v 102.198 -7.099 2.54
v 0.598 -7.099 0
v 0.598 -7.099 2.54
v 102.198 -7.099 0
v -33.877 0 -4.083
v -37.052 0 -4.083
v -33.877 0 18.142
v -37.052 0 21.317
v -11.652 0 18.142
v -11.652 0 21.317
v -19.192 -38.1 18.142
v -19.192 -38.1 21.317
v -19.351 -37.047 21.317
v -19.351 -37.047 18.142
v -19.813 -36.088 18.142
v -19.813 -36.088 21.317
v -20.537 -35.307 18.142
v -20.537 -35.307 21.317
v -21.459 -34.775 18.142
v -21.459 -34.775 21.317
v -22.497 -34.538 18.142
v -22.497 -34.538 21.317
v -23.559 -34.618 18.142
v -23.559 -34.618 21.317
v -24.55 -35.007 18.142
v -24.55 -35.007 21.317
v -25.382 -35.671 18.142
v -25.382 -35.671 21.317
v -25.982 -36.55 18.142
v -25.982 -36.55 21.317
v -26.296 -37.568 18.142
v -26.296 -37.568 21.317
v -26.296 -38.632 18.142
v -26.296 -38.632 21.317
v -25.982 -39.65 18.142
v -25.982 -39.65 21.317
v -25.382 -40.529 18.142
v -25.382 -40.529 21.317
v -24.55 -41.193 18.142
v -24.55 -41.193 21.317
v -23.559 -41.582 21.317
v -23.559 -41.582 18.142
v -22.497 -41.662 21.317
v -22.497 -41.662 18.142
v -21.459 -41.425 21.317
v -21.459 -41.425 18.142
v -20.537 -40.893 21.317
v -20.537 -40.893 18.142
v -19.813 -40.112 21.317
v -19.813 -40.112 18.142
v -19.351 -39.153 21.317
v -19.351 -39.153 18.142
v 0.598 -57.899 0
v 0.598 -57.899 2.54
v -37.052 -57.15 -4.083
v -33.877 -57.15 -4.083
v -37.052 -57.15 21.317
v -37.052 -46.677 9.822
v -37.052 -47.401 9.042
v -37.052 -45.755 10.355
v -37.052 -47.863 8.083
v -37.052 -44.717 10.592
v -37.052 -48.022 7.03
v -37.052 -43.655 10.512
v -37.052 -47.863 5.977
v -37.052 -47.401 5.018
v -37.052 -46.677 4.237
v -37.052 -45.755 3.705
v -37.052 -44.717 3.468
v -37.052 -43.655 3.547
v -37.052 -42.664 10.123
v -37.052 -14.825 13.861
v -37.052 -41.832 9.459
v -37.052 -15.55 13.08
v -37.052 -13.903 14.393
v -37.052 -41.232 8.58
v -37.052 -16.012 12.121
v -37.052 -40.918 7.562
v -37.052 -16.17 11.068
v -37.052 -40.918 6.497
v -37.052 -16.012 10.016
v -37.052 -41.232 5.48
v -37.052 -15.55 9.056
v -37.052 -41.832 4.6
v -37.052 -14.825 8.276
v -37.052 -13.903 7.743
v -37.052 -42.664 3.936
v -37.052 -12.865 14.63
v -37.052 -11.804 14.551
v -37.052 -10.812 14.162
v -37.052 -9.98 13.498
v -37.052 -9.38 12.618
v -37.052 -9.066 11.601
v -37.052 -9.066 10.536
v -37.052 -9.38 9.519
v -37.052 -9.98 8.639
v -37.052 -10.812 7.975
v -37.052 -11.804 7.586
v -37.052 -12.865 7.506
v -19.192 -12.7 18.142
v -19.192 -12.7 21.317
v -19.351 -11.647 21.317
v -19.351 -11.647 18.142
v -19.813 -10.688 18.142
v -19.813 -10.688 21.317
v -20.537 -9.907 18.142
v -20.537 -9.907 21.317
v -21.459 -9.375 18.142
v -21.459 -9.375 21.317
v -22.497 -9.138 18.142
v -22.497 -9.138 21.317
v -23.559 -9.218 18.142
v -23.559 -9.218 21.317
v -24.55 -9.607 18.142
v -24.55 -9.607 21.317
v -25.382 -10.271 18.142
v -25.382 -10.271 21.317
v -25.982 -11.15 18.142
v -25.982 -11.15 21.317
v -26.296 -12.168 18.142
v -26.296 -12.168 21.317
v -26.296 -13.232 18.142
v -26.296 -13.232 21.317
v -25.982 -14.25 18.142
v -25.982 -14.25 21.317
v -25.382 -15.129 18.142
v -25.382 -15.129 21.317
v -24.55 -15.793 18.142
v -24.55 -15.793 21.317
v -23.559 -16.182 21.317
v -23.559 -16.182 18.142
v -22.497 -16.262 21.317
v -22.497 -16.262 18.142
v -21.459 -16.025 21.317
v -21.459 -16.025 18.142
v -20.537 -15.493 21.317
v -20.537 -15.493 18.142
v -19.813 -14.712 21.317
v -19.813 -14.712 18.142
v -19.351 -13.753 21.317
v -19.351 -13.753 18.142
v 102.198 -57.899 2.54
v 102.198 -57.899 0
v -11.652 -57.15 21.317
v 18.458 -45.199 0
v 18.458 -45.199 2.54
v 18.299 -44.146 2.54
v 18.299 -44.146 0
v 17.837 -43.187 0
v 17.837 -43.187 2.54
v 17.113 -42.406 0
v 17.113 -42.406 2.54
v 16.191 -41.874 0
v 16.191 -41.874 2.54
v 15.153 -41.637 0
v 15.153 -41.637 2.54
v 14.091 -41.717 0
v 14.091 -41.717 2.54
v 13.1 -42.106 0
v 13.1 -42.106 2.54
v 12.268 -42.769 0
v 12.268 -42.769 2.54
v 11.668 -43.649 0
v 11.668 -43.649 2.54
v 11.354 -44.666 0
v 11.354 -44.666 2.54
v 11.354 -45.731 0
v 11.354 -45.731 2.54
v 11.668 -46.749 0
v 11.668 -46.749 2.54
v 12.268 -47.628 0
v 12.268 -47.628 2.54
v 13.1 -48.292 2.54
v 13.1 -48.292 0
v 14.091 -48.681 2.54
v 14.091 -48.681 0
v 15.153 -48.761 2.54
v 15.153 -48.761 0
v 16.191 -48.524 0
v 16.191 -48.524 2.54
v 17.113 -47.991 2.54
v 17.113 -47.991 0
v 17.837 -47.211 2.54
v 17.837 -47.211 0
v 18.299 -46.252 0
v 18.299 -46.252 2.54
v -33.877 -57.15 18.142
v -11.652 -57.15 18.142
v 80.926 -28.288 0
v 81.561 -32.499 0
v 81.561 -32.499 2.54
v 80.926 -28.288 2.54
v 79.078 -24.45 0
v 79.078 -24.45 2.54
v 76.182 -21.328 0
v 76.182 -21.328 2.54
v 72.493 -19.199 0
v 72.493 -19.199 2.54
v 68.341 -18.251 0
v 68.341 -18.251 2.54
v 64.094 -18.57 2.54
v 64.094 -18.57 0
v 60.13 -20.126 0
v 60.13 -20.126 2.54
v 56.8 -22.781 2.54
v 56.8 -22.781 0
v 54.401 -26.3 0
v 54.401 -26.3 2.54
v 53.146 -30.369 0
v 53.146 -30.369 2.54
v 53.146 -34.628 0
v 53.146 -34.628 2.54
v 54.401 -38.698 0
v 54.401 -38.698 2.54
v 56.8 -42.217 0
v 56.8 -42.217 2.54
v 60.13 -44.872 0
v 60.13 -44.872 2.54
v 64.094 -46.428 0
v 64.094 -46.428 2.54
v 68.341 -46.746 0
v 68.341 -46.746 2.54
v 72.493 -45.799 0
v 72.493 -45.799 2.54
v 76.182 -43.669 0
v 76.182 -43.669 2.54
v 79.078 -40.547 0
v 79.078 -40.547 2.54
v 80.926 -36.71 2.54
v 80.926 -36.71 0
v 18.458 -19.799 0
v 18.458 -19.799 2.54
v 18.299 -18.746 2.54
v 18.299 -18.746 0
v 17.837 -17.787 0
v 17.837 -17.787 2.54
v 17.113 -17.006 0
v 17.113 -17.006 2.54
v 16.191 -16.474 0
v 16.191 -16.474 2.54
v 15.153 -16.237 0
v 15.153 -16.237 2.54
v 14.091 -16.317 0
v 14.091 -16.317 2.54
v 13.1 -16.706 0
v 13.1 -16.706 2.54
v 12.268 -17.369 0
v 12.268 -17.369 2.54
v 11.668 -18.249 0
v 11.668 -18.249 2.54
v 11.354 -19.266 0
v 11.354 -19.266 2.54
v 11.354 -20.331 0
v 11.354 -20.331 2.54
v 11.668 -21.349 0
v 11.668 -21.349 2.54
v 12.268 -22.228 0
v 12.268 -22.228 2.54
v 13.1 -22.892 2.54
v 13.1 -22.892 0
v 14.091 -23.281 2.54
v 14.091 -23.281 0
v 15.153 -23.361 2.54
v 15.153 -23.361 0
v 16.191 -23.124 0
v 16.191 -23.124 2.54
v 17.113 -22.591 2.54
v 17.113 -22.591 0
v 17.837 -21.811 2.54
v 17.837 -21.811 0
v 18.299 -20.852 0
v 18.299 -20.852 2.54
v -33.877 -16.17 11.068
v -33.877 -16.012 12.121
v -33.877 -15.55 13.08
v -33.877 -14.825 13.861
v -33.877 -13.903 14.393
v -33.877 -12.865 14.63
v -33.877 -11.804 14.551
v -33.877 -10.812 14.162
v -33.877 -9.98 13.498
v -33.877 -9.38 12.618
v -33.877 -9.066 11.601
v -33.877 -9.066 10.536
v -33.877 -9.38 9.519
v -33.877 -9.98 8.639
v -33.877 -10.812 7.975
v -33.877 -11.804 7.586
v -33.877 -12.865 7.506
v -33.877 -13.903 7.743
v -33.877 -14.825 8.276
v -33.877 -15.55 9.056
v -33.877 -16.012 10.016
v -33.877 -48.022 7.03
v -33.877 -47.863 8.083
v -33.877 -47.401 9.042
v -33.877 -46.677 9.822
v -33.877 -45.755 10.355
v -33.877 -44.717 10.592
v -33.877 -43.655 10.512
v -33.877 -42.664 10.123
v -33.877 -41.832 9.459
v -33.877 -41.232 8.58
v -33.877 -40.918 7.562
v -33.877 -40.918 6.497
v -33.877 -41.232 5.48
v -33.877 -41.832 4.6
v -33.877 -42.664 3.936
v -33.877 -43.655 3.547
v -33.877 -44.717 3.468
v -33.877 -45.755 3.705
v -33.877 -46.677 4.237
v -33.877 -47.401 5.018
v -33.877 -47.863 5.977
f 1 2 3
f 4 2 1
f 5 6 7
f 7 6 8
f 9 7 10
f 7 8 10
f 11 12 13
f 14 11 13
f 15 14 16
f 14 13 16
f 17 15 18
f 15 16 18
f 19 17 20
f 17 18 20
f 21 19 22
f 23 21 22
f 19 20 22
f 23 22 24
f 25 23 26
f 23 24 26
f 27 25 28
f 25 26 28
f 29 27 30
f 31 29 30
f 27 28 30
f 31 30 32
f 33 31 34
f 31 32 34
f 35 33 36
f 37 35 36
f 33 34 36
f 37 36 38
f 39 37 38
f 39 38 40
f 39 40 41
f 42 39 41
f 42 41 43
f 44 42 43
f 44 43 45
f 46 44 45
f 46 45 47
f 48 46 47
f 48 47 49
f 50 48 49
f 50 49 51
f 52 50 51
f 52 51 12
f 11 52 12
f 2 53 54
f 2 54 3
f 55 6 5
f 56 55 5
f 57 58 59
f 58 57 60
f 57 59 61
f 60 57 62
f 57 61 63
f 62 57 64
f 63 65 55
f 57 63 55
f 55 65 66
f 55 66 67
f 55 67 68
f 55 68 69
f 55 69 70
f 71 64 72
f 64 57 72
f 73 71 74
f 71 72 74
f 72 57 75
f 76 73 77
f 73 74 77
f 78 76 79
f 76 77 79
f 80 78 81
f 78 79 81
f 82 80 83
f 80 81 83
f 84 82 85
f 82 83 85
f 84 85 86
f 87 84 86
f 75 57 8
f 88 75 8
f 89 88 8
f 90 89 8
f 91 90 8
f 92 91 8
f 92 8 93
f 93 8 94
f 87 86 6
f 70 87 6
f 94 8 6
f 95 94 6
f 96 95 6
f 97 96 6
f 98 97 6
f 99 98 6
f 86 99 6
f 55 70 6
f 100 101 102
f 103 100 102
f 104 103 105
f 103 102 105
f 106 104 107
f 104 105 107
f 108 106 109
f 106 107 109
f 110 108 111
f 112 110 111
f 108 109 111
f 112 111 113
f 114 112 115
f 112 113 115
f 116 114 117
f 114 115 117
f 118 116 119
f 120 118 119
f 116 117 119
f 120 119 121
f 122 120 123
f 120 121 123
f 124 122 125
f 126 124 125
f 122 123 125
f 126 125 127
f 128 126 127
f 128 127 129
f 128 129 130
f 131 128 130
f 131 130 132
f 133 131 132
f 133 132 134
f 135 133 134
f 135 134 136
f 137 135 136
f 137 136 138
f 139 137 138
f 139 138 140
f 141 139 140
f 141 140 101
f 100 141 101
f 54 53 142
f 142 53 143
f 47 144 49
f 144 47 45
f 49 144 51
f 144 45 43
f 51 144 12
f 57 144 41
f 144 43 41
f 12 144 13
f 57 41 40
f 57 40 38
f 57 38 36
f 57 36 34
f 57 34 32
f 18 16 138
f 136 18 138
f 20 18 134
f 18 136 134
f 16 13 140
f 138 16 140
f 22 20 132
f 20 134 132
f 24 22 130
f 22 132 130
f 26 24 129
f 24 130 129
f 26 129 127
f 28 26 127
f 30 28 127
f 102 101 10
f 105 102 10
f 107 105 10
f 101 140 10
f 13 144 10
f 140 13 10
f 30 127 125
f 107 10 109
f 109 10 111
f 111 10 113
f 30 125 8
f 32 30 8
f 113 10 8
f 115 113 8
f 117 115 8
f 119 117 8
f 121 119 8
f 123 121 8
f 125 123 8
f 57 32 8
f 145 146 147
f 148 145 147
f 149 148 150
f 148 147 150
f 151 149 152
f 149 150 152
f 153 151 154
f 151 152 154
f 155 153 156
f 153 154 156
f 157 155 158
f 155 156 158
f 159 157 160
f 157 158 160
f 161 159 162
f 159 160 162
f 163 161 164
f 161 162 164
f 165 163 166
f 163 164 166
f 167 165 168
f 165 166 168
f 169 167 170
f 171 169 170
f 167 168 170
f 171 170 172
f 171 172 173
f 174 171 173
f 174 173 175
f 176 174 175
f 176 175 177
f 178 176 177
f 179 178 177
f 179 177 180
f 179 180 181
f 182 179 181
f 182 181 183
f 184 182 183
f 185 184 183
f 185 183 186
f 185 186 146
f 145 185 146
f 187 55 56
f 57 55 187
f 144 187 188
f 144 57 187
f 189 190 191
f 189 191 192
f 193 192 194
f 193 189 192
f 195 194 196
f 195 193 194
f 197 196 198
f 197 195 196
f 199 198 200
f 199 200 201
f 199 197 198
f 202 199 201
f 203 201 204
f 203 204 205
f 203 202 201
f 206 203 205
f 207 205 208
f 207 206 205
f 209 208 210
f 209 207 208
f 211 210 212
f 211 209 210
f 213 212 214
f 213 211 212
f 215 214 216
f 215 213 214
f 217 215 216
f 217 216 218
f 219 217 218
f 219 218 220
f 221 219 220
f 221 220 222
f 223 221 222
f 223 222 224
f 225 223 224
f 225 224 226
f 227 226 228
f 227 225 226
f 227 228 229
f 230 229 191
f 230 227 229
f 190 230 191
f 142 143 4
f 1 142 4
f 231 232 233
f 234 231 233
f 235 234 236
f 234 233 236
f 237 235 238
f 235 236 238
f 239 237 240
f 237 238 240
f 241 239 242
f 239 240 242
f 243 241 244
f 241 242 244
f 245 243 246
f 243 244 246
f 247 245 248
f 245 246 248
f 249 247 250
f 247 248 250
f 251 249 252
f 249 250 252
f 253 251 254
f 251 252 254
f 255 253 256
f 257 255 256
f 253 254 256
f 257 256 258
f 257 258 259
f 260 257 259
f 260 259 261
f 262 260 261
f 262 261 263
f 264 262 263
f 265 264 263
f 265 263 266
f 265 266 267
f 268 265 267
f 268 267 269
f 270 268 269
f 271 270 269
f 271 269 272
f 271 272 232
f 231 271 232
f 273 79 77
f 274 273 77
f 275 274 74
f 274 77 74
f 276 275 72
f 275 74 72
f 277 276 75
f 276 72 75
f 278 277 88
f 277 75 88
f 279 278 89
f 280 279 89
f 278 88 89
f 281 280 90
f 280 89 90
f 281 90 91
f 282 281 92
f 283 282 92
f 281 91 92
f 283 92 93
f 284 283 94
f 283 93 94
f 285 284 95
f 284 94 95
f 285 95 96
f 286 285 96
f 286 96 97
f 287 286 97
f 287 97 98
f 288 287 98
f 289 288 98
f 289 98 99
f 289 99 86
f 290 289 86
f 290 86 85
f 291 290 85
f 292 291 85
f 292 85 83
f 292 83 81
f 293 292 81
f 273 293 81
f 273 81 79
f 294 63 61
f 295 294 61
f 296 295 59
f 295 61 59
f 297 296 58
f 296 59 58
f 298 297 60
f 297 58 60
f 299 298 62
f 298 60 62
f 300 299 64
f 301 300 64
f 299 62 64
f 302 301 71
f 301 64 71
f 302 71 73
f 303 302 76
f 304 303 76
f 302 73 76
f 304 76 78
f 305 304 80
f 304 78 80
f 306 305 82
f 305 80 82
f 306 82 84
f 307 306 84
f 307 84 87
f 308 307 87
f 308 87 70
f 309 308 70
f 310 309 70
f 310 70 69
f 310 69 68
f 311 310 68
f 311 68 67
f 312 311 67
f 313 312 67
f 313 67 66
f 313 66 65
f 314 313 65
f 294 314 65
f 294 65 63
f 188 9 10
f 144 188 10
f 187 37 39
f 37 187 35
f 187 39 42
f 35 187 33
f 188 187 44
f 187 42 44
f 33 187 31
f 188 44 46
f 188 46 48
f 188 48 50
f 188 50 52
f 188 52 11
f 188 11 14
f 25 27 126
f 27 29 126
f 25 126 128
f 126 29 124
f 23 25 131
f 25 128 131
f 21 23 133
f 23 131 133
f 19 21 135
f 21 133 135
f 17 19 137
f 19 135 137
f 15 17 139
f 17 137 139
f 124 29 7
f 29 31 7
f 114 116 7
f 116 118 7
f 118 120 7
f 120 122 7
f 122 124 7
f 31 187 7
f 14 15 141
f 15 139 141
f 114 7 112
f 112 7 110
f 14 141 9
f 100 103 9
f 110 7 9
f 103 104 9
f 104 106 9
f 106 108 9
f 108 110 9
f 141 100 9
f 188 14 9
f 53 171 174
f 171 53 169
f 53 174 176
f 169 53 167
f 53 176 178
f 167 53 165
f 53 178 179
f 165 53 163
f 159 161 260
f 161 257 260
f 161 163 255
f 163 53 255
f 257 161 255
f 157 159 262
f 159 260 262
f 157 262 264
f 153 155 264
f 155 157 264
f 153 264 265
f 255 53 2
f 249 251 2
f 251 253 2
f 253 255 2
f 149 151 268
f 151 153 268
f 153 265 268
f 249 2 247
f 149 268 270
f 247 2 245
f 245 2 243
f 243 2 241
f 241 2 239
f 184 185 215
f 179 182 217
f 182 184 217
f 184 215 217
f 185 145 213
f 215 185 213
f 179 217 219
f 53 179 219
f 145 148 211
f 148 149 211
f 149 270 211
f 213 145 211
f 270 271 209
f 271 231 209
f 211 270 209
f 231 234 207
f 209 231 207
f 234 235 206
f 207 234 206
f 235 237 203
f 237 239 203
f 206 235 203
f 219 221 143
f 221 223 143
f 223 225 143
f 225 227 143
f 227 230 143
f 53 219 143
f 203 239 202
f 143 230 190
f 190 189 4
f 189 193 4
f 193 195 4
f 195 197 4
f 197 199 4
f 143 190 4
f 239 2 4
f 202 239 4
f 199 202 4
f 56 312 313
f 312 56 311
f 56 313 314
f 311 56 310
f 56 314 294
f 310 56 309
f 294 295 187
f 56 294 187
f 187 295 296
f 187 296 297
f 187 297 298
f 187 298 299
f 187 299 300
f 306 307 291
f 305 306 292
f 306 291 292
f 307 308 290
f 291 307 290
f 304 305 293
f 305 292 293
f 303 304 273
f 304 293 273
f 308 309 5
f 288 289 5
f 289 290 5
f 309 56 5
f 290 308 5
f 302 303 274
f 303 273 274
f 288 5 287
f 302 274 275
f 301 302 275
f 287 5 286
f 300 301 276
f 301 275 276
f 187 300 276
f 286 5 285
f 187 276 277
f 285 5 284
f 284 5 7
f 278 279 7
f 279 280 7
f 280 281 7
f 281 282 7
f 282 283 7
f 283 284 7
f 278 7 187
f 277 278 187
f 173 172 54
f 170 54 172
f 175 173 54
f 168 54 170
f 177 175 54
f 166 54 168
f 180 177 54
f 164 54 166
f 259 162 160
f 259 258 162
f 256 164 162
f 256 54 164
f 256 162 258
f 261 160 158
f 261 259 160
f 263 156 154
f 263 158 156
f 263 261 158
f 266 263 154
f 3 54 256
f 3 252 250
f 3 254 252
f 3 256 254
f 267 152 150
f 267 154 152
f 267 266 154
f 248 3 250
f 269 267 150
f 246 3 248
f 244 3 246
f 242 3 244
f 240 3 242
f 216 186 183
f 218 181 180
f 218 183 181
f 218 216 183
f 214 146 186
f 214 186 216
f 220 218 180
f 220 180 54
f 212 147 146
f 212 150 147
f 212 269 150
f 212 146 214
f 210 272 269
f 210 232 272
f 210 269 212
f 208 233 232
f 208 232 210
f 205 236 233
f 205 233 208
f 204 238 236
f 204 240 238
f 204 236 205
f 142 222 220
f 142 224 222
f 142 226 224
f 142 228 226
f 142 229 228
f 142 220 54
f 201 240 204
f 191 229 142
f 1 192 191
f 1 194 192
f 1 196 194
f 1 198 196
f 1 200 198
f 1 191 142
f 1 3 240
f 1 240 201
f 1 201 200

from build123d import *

# Parameters (mm, degrees)
F0_W     = 101.6
F0_H     = 50.8
F0_R     = 14.2875
F1_DEPTH = 2.54
F2_W     = 3.175
F2_H     = 3.175
F2_W_2   = 22.225
F2_H_2   = 22.225
F3_DEPTH = 57.15
F4_R     = 3.571875
F5_DEPTH = 25.4
F6_R     = 3.571875
F7_DEPTH = 25.4
F8_R     = 3.571875
F9_DEPTH = 5.08


with BuildPart() as f1:
    # F0 (on Top) → F1 (new body)
    with BuildSketch(Plane.XY):
        with Locations((51.398457, -32.49885)):
            Rectangle(F0_W, F0_H)
        with Locations((67.273457, -32.49885)):
            Circle(F0_R, mode=Mode.SUBTRACT)
    extrude(amount=F1_DEPTH)

    # F6 (on face) → F7 (cut)
    with BuildSketch(Plane.XY.offset(2.54)):
        with Locations((14.885957, -19.79885)):
            Circle(F6_R)
        with Locations((14.885957, -45.19885)):
            Circle(F6_R)
    extrude(amount=-F7_DEPTH, mode=Mode.SUBTRACT)


with BuildPart() as f3:
    # F2 (on Front) → F3 (new body)
    with BuildSketch(Plane.XZ):
        with Locations((-35.464063, 19.729778)):
            Rectangle(F2_W, F2_H)
        with Locations((-22.764063, 19.729778)):
            Rectangle(F2_W_2, F2_H)
        with Locations((-35.464063, 7.029778)):
            Rectangle(F2_W, F2_H_2)
    extrude(amount=F3_DEPTH)

    # F4 (on face) → F5 (cut)
    with BuildSketch(Plane.XY.offset(21.317278)):
        with Locations((-22.764063, -12.7)):
            Circle(F4_R)
        with Locations((-22.764063, -38.1)):
            Circle(F4_R)
    extrude(amount=-F5_DEPTH, mode=Mode.SUBTRACT)

    # F8 (on face) → F9 (cut)
    with BuildSketch(Plane(origin=(-37.051563, 0, 0), x_dir=(0, -1, 0), z_dir=(-1, 0, 0))):
        with Locations((12.5984, 11.068378)):
            Circle(F8_R)
        with Locations((44.45, 7.029778)):
            Circle(F8_R)
    extrude(amount=-F9_DEPTH, mode=Mode.SUBTRACT)


solid = Compound([f1.part, f3.part])
